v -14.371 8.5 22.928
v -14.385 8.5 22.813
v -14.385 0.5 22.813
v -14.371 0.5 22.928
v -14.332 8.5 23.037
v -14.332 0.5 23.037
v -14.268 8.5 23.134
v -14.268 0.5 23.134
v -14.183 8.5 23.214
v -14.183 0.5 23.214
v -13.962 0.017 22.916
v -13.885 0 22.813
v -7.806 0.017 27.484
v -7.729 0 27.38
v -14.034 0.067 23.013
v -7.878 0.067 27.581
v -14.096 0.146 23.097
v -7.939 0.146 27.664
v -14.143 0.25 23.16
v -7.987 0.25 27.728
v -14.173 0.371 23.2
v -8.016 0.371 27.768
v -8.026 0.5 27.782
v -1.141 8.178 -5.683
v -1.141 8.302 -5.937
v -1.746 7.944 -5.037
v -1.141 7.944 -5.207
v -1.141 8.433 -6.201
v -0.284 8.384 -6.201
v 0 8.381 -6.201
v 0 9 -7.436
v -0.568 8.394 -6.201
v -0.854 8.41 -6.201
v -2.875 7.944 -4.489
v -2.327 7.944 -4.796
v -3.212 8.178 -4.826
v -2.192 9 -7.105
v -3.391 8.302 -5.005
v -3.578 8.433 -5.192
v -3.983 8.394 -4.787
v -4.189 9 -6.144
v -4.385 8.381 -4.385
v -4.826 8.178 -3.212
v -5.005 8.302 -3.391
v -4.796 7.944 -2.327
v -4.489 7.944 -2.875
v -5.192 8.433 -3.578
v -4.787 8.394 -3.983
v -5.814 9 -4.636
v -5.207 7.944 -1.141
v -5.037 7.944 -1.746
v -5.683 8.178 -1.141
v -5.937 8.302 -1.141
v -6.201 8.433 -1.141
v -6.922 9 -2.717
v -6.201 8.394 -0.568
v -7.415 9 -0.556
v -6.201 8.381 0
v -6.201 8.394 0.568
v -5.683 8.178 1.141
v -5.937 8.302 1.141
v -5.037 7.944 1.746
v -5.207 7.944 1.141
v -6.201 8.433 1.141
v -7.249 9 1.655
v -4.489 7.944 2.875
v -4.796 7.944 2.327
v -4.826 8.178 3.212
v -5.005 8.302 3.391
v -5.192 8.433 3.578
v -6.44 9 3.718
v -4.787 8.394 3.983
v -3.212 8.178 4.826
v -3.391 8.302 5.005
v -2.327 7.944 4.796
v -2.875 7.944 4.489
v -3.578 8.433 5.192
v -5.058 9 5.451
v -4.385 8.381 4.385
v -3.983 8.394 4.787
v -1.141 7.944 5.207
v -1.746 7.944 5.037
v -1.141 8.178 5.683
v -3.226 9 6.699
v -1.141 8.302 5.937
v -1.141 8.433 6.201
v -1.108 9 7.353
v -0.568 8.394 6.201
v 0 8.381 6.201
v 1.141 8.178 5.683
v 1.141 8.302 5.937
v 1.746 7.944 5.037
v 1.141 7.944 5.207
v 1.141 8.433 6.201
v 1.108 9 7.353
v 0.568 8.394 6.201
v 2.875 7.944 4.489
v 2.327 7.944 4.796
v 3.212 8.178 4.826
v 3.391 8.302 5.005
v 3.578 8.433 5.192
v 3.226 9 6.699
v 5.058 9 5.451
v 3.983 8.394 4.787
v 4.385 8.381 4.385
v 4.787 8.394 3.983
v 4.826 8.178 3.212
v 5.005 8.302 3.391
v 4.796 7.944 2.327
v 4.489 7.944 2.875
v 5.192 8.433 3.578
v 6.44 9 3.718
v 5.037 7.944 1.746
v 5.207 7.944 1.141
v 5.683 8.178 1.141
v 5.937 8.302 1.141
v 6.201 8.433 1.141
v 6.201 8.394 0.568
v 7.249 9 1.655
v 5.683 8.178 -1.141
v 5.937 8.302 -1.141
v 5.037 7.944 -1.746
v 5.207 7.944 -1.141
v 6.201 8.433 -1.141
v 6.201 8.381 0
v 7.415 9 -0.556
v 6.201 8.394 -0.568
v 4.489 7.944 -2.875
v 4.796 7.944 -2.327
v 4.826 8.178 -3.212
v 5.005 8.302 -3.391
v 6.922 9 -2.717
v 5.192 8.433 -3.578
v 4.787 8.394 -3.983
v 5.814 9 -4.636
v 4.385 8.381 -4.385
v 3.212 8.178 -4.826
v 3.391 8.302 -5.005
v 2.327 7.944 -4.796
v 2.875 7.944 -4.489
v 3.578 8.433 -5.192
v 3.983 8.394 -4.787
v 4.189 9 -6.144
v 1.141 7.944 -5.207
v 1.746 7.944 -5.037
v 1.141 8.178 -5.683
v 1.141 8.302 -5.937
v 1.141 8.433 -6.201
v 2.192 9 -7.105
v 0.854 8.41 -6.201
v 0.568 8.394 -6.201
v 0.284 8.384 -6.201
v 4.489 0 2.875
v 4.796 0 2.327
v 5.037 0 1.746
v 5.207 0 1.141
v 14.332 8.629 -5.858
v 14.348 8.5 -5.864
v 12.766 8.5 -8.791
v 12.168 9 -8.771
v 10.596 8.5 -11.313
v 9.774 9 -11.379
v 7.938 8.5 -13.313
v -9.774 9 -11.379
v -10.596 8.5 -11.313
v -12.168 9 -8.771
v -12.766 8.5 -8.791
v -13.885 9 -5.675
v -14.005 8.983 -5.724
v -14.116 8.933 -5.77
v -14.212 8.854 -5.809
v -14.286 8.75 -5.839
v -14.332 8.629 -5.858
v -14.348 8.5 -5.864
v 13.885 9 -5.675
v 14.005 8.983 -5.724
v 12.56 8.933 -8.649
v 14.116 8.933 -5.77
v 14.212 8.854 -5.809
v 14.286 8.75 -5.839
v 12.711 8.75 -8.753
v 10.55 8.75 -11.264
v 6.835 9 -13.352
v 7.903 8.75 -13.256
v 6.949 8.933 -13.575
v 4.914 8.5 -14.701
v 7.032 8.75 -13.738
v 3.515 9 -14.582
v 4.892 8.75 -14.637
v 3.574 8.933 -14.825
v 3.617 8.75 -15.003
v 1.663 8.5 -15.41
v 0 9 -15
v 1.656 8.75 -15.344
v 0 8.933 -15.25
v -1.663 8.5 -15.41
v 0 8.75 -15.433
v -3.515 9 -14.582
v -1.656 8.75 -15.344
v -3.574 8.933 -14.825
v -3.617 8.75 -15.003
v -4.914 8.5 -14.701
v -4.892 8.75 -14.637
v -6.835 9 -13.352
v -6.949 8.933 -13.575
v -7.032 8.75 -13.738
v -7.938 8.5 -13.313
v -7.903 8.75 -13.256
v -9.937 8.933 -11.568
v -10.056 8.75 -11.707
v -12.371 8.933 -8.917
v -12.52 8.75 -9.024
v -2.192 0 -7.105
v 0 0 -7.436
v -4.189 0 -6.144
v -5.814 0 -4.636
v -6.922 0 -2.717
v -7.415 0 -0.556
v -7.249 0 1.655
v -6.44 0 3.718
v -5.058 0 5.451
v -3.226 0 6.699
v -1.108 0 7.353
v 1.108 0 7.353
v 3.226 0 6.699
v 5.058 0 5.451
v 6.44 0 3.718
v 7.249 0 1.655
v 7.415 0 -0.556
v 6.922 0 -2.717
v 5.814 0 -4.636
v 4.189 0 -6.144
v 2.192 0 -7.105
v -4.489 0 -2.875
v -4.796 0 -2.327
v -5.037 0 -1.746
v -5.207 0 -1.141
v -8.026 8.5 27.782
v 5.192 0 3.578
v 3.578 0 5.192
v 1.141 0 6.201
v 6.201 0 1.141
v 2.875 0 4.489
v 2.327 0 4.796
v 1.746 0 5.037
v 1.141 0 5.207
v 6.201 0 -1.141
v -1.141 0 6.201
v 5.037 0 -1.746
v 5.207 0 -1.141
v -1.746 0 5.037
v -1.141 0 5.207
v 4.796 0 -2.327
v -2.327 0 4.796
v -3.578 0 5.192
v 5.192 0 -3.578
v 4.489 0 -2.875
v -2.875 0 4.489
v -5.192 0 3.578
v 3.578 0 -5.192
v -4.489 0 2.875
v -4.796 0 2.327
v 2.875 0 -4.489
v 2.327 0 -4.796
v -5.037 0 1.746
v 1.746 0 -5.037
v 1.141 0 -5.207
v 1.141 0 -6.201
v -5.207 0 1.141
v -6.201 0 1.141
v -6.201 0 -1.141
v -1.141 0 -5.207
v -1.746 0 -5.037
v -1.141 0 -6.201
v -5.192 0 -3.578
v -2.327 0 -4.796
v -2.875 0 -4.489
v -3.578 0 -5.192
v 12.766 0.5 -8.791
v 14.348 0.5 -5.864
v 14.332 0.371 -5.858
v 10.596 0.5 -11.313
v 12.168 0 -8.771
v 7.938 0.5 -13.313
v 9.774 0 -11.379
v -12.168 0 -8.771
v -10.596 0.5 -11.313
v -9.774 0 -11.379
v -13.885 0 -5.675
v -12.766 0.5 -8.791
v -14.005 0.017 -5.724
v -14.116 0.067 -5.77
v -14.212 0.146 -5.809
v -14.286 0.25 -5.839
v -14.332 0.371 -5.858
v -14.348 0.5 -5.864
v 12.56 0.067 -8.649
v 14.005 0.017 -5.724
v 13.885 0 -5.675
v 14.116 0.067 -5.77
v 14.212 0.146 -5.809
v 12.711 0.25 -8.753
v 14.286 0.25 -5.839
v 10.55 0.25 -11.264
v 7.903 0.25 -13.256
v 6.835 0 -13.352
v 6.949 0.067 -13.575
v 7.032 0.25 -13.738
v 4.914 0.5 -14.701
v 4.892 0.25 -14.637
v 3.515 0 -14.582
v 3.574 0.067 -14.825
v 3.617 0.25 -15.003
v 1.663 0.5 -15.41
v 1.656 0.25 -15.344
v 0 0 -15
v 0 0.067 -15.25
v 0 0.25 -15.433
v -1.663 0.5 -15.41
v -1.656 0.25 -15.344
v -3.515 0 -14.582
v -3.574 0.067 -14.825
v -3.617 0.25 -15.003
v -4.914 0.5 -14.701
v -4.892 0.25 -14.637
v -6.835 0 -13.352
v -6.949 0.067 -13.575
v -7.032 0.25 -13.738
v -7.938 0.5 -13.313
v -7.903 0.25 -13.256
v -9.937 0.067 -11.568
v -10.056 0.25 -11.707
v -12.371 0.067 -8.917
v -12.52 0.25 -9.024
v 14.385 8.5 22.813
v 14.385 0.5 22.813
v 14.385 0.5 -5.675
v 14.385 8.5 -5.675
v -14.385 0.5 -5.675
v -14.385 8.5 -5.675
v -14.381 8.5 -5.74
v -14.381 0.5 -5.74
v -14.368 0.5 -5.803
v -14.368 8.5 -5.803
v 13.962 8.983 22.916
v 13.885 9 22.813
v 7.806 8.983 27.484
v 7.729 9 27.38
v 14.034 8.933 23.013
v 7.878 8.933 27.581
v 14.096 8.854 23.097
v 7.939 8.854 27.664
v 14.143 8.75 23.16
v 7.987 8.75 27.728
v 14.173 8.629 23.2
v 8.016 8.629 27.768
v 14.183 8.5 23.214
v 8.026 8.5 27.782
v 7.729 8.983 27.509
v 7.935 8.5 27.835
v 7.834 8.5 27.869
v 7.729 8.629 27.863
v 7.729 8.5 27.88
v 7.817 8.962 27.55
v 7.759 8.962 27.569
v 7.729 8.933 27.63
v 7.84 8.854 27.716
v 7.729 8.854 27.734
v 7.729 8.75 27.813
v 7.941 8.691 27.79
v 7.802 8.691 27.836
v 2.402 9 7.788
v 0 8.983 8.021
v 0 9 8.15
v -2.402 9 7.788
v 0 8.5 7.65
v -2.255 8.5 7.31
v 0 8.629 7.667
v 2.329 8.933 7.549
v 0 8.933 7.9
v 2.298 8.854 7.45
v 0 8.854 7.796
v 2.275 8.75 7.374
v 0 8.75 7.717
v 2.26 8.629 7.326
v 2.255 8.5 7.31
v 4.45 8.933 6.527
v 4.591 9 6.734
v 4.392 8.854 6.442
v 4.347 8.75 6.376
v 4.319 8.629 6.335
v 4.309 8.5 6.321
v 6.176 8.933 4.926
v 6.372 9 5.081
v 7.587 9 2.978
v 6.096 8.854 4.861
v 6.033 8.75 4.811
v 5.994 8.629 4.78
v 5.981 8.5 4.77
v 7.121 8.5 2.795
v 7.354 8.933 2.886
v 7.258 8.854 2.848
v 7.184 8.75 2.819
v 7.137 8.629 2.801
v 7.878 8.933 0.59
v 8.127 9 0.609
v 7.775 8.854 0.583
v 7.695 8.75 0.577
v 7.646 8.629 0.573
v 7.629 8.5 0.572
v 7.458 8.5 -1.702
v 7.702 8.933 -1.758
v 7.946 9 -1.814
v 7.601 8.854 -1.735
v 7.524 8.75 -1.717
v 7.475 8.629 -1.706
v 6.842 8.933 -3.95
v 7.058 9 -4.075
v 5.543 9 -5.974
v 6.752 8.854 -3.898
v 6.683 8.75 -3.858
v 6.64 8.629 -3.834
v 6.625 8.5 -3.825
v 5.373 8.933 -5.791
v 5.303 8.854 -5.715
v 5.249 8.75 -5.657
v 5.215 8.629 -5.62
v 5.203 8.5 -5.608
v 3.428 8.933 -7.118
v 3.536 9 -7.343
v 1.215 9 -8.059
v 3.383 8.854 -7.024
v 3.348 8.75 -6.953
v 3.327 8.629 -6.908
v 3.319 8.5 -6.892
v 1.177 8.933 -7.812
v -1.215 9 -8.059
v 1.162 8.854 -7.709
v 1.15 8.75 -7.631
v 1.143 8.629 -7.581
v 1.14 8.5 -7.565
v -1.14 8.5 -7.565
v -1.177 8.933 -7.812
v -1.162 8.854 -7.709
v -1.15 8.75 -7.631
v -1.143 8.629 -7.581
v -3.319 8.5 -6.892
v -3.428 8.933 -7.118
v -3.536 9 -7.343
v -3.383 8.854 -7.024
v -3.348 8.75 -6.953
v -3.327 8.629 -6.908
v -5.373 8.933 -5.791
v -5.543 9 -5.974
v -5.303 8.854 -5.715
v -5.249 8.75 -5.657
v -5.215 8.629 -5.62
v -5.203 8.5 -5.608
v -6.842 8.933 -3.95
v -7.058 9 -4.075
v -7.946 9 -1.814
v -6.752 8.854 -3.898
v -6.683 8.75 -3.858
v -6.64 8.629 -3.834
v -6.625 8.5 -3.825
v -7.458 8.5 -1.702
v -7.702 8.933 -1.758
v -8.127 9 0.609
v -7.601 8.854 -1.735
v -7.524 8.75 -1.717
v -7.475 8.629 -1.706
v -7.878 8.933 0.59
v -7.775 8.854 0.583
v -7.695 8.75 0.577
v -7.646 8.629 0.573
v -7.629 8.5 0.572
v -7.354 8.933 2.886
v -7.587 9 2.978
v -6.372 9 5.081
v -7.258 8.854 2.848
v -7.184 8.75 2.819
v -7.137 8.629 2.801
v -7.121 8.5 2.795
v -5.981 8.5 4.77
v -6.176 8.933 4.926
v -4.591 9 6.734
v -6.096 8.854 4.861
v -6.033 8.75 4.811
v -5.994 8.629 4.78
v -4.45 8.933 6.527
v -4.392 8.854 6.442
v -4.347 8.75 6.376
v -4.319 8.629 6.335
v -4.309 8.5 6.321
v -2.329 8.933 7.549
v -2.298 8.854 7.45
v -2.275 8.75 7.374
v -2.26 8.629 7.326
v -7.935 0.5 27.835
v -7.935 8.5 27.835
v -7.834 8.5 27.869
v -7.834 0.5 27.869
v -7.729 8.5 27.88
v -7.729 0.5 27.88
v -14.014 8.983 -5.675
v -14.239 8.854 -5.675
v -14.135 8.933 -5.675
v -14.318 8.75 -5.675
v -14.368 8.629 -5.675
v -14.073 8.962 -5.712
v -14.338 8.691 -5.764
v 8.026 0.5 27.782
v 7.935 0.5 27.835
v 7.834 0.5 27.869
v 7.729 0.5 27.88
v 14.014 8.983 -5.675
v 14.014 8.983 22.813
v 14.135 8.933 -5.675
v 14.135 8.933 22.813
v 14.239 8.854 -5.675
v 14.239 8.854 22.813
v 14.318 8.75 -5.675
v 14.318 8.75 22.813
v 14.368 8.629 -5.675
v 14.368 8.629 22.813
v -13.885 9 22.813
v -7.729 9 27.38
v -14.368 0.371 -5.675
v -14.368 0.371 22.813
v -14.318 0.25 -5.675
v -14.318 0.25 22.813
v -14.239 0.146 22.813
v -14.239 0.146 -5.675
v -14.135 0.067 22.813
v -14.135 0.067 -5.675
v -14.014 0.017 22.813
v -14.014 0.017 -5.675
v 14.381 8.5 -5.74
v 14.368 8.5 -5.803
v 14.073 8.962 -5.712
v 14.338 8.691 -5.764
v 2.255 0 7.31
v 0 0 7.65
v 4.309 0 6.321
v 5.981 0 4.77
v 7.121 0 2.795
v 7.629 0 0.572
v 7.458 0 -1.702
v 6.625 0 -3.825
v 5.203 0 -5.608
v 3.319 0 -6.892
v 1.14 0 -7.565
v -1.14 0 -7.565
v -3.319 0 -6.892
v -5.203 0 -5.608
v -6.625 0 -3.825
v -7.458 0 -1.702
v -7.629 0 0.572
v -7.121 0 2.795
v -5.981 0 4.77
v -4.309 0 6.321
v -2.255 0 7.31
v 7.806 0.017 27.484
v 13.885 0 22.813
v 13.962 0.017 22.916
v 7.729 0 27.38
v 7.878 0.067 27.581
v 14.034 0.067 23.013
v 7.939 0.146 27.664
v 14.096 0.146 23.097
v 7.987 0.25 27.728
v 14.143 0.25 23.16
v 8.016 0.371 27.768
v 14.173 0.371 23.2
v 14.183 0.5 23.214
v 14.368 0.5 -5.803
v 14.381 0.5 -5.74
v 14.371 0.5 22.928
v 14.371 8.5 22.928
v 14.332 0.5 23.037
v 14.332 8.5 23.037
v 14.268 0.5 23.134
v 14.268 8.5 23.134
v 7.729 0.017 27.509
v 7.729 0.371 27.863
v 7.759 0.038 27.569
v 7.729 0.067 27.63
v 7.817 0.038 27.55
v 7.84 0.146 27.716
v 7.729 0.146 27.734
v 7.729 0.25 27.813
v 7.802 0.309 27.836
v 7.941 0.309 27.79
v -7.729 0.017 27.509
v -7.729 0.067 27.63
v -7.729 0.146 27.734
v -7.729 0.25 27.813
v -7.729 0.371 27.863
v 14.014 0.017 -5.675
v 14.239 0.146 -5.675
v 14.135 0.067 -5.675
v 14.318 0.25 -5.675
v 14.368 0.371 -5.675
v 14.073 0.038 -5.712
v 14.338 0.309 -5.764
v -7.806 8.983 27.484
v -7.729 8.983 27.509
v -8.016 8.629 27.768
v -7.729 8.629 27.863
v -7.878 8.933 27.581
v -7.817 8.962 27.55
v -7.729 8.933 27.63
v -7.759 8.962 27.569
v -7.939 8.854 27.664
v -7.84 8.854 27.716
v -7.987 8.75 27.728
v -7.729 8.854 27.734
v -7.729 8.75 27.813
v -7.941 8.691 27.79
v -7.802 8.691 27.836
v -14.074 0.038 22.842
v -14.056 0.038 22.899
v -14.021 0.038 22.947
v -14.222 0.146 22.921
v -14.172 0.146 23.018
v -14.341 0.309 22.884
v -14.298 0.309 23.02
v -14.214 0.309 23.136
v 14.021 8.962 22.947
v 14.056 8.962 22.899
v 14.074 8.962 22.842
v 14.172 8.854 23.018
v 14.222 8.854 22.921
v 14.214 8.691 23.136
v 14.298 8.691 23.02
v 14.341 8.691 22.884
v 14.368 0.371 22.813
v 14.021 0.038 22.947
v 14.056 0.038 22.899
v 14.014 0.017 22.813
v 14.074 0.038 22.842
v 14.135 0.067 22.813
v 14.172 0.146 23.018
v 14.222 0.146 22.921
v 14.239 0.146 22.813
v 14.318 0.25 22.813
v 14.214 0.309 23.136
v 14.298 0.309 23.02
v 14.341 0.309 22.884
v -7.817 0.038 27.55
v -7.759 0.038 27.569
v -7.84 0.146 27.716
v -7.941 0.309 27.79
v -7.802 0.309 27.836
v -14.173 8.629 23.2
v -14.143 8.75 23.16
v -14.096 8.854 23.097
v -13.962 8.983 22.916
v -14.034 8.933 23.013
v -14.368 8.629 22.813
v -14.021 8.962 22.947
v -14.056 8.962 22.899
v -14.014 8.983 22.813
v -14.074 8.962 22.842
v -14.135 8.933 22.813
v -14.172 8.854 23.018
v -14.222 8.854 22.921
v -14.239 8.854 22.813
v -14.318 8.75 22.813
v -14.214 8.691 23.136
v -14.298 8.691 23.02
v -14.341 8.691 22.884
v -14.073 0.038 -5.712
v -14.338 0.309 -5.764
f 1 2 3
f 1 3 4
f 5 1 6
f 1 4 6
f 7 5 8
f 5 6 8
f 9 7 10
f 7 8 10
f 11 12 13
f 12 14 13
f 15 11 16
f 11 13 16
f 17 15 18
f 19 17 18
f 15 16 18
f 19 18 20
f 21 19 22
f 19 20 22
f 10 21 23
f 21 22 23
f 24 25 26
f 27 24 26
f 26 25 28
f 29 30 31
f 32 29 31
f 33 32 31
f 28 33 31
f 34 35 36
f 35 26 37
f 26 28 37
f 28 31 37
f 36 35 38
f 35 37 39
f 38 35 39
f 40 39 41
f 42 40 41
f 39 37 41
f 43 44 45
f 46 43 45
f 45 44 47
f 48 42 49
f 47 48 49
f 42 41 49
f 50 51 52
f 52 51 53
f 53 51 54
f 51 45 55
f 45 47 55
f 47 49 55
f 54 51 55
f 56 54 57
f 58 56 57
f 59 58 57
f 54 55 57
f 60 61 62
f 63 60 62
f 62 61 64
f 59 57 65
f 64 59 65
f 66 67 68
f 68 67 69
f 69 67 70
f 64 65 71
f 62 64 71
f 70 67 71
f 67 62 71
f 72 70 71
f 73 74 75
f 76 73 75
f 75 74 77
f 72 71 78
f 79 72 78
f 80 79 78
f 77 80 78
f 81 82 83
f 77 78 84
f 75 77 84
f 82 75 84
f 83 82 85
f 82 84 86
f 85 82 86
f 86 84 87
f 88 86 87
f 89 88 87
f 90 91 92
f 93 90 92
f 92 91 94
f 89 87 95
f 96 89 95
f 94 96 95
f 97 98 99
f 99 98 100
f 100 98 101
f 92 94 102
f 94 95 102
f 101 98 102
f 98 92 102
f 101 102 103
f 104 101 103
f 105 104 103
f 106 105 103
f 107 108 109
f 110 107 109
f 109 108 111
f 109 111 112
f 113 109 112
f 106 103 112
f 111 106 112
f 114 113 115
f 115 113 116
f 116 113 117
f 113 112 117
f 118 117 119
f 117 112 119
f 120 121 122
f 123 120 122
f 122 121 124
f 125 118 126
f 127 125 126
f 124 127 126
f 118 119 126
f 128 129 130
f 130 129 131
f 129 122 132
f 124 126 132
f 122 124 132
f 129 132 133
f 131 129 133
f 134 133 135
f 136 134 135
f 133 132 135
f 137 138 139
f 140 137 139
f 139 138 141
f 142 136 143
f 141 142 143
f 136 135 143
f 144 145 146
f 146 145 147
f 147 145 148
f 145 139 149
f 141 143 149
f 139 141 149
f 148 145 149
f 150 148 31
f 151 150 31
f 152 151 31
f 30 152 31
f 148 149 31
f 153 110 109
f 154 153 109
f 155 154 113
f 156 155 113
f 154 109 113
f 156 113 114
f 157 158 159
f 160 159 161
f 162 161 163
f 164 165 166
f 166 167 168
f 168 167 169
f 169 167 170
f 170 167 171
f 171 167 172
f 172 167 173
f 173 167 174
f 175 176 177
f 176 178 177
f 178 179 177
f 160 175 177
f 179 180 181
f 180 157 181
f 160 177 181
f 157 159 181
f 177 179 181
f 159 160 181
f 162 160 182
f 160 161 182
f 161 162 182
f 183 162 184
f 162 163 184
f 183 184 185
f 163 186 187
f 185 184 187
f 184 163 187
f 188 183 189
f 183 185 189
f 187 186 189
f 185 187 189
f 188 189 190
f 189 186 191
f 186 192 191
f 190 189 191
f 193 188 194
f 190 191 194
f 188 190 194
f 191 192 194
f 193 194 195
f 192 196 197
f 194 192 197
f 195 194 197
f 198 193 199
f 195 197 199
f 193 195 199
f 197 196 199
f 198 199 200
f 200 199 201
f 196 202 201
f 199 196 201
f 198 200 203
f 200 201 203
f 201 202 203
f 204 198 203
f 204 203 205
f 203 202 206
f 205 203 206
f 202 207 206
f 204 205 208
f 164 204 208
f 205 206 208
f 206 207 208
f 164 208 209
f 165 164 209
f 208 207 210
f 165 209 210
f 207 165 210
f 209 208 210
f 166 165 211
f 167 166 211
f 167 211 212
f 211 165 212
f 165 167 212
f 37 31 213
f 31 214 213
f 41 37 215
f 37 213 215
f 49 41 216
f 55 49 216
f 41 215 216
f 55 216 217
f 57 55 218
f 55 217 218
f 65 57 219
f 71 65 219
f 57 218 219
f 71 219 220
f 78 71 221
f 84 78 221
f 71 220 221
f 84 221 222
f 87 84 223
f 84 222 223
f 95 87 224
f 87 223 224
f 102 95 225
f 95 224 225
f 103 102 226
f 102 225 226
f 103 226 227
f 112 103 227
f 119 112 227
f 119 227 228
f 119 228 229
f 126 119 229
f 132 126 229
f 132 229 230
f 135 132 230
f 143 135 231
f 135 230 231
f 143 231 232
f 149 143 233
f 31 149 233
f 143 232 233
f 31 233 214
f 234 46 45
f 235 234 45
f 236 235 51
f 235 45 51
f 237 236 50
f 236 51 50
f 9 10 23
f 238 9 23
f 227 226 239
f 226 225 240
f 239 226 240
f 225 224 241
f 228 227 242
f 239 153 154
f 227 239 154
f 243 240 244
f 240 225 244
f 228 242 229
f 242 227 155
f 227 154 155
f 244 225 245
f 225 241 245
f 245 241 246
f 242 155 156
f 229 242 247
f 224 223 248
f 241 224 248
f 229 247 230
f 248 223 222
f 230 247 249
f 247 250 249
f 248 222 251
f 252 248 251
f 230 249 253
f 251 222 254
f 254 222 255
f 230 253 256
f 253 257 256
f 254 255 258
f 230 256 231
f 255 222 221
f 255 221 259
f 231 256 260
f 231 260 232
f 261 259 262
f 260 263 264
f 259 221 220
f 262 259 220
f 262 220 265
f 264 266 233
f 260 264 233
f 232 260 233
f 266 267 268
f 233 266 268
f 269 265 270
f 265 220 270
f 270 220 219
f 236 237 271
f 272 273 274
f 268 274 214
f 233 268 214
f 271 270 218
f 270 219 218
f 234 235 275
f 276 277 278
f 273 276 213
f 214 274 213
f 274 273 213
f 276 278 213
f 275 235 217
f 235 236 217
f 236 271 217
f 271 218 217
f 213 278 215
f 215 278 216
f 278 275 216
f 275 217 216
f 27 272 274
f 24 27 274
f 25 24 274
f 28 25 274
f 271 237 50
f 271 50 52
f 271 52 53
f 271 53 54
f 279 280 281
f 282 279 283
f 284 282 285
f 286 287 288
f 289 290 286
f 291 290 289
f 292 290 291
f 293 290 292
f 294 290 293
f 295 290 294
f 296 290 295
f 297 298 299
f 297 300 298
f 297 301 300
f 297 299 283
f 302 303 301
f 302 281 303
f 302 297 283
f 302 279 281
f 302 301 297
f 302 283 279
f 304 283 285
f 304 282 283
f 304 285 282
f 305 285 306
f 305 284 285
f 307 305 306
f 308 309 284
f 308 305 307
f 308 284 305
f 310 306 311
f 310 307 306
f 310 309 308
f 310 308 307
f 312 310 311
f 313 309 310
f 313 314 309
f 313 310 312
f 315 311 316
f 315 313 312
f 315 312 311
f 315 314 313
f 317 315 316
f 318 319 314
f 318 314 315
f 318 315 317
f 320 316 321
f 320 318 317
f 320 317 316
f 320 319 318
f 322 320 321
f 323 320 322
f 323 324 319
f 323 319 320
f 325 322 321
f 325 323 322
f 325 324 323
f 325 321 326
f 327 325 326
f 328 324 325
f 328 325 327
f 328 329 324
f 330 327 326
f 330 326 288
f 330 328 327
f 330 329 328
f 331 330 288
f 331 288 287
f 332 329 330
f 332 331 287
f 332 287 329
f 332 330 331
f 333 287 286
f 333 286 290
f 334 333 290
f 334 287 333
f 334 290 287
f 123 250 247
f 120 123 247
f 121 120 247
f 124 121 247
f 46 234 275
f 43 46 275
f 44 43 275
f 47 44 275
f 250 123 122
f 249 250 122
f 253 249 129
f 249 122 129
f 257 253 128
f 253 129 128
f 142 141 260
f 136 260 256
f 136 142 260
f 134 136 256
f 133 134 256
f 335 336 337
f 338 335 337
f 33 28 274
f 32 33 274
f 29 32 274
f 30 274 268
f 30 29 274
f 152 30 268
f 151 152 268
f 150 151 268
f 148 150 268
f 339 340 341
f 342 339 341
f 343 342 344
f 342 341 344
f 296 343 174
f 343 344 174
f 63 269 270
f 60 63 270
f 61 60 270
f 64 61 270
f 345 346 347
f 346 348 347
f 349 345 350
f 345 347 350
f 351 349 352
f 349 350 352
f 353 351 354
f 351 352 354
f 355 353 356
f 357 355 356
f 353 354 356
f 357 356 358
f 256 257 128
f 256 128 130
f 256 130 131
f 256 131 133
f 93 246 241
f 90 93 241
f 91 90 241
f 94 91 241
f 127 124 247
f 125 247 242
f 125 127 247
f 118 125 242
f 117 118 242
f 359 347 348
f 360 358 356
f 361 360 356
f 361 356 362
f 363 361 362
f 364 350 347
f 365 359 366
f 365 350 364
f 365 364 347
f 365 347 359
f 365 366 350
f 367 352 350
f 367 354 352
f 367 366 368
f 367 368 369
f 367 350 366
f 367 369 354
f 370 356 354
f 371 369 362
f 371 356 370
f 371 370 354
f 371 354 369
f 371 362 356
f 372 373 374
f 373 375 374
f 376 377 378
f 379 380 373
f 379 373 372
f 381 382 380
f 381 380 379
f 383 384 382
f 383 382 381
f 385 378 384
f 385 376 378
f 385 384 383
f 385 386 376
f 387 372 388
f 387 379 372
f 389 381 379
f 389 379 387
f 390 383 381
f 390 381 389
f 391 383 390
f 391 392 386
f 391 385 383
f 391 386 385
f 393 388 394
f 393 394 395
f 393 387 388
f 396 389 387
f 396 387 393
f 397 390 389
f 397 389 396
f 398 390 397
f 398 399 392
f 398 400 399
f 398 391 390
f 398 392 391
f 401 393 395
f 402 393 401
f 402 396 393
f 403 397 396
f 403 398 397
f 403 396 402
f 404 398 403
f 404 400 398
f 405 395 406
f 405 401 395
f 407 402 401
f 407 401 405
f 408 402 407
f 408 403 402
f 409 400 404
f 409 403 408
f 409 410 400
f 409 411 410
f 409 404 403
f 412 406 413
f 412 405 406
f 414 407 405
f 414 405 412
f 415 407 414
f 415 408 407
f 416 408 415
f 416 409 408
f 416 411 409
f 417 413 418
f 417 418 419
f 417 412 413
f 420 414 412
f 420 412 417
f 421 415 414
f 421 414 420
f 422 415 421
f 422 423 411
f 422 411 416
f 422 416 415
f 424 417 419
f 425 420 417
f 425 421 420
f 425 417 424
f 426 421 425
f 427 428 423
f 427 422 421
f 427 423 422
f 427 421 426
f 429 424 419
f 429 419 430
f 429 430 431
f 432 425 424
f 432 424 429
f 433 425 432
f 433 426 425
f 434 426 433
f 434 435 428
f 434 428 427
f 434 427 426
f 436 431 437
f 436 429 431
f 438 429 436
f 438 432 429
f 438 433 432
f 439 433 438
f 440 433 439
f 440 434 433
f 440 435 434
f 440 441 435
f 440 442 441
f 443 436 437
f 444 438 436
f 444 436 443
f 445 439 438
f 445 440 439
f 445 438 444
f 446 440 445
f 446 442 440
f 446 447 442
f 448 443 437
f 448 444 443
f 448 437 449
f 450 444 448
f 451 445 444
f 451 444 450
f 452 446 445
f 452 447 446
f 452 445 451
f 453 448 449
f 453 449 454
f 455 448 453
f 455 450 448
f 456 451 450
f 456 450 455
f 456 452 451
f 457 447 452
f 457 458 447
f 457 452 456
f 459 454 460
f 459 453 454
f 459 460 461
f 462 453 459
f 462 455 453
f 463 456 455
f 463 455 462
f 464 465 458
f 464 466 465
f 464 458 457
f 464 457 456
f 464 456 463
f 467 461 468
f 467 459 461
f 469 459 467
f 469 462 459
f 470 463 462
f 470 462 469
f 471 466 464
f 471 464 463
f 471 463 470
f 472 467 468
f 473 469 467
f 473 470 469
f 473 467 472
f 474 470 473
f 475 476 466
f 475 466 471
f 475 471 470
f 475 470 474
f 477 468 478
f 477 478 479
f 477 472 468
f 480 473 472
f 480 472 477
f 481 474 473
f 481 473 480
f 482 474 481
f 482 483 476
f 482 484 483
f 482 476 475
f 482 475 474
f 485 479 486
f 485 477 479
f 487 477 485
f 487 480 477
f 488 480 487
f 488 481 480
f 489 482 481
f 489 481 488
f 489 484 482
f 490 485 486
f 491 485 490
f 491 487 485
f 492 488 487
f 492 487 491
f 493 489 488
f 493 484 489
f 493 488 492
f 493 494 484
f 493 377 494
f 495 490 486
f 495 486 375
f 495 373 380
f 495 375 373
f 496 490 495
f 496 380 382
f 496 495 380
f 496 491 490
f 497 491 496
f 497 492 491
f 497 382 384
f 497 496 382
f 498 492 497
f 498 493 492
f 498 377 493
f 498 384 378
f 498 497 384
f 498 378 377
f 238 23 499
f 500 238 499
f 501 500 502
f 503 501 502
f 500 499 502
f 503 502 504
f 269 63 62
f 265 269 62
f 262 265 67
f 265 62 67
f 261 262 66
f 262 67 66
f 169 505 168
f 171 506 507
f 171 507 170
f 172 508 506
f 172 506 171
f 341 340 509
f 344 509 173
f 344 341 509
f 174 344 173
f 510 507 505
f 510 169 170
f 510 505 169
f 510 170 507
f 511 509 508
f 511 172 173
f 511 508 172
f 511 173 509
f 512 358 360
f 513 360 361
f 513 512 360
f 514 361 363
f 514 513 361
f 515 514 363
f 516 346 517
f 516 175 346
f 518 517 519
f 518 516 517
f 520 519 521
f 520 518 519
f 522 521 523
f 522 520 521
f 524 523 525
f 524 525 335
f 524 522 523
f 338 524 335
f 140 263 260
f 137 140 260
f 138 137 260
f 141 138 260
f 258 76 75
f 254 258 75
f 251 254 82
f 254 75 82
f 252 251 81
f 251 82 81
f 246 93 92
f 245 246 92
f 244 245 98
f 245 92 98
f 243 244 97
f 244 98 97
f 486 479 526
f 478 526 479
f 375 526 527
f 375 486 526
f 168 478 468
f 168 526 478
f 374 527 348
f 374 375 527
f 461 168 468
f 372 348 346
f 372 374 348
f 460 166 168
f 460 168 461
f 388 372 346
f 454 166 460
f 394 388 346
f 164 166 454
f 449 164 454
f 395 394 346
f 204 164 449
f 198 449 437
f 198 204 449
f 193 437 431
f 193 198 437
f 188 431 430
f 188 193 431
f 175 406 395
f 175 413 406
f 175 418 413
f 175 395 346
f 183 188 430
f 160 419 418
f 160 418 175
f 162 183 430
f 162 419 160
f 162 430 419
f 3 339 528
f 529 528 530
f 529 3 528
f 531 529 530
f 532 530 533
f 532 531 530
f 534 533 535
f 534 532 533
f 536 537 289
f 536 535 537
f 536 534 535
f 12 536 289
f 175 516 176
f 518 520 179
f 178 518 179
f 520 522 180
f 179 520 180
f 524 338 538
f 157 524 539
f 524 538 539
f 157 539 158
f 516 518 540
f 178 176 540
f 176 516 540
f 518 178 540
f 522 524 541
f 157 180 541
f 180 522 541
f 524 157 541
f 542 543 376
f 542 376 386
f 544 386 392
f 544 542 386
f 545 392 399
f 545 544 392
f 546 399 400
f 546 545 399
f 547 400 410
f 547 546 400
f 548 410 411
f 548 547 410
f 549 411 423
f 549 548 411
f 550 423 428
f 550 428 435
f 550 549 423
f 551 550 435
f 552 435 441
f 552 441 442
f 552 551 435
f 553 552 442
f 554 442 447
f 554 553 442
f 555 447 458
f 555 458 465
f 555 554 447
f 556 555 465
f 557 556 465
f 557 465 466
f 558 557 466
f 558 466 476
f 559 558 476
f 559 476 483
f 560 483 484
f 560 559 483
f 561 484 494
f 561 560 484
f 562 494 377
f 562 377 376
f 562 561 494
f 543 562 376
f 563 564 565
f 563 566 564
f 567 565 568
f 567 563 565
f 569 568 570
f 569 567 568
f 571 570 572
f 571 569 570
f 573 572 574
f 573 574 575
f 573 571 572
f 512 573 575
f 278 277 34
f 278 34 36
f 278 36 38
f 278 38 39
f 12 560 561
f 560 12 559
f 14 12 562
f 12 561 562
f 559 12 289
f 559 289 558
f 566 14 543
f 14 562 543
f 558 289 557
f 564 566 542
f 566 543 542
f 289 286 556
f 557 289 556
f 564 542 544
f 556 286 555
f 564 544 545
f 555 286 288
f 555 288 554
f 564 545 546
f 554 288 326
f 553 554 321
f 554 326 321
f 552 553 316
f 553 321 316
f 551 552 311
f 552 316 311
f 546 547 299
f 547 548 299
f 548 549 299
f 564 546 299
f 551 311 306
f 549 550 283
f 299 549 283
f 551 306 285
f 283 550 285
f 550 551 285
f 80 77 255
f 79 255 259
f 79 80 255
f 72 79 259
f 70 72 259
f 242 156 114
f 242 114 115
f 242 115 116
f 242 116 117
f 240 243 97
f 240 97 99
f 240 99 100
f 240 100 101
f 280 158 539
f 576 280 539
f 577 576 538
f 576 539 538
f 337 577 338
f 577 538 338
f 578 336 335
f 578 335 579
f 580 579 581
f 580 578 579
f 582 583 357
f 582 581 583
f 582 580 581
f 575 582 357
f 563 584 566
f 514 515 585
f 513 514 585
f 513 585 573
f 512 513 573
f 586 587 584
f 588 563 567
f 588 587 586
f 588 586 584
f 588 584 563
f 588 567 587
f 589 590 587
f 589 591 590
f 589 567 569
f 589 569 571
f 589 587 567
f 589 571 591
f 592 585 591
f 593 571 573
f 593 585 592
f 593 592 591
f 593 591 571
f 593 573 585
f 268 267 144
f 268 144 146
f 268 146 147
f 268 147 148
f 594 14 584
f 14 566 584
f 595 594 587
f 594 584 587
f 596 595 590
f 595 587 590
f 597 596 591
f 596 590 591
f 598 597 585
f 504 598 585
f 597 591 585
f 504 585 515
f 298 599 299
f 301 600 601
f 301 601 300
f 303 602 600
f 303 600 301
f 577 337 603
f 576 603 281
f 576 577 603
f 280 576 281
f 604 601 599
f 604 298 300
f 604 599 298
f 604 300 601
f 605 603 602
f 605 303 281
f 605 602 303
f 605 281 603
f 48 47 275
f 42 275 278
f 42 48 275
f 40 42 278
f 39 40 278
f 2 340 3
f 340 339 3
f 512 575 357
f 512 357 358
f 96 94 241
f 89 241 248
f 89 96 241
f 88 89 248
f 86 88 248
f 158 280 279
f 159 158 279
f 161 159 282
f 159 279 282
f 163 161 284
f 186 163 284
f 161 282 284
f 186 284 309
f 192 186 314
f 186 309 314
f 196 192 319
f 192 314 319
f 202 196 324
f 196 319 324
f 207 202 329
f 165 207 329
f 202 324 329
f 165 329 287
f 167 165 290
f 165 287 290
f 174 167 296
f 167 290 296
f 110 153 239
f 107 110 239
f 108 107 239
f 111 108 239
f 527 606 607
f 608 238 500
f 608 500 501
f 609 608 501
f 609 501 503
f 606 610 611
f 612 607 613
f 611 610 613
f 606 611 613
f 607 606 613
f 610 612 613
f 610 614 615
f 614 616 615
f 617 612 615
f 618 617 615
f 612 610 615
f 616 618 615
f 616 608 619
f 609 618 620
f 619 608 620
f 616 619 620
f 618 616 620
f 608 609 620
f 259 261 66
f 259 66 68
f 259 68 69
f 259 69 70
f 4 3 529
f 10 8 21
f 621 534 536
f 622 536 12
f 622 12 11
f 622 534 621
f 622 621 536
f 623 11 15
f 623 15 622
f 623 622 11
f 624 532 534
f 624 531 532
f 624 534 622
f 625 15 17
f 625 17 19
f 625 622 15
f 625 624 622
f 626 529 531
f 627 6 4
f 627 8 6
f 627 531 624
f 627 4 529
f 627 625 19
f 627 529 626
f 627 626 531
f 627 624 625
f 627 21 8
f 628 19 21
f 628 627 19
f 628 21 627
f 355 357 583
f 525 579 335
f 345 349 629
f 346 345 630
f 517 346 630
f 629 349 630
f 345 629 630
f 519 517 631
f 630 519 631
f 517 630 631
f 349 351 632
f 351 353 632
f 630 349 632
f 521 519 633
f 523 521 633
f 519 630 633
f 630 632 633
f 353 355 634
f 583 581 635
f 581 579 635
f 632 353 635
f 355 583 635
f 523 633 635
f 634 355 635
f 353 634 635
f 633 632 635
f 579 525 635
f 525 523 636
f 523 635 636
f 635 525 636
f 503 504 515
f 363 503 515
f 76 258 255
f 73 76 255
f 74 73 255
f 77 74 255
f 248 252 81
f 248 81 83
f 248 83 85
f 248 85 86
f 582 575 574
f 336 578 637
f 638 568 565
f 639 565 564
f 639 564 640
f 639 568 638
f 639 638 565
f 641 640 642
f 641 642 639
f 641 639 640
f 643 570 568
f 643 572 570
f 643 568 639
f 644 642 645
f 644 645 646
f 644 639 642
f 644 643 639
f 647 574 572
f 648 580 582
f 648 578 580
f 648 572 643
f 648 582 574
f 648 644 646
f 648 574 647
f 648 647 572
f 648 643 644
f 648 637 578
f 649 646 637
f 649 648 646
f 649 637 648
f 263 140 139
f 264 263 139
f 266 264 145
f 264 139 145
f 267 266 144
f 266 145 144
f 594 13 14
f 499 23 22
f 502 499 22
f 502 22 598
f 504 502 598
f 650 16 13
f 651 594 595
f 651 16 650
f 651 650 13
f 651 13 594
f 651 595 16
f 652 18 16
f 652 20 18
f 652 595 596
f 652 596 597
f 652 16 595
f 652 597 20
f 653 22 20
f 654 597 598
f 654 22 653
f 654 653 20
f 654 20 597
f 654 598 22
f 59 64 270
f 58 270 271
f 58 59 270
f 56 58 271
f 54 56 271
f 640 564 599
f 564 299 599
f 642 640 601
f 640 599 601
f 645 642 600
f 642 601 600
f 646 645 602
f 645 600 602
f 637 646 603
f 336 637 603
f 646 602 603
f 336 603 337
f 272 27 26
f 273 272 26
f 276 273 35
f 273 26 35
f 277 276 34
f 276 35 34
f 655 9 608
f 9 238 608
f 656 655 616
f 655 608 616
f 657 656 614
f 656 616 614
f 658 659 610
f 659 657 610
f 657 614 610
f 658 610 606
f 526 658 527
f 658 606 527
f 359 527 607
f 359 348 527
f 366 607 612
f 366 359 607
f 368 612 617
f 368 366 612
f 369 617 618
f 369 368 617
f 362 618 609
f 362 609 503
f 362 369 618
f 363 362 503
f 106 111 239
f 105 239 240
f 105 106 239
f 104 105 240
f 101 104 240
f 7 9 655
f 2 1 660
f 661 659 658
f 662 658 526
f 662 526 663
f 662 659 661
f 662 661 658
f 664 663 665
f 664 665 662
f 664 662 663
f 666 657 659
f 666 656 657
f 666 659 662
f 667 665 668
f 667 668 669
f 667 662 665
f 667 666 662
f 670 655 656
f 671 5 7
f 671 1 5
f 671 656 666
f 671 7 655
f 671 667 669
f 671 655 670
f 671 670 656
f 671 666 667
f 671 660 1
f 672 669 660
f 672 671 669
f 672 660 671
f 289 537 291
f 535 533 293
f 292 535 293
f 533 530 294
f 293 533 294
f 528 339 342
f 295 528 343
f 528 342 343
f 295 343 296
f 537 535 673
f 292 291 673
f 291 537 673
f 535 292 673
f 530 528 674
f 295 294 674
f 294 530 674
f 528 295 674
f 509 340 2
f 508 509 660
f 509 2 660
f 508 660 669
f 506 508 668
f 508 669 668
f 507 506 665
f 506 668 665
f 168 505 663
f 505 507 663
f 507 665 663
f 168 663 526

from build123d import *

# Parameters (mm, degrees)
SKETCH1_R           = 7.65
BOSS_EXTRUDE1_DEPTH = 9
CUT_EXTRUDE1_DEPTH  = 9
SKETCH7_W           = 2.28233216
SKETCH7_H           = 6.201106096
CUT_EXTRUDE2_DEPTH  = 33.637748467
CIRPATTERN1_COUNT   = 8
FILLET1_R           = 0.5


with BuildPart() as part:
    # Sketch1 → Boss-Extrude1 (new body)
    with BuildSketch(Plane(origin=(0, 0, 0), x_dir=(1, 0, 0), z_dir=(0, 1, 0))):
        with BuildLine():
            Line((-14.385, 5.772501624), (-14.385, -27.88))
            Line((-14.385, -27.88), (14.385, -27.88))
            Line((14.385, -27.88), (14.385, 5.772501624))
            ThreePointArc((14.385, 5.772501624), (0, 15.5), (-14.385, 5.772501624))
        make_face()
        Circle(SKETCH1_R, mode=Mode.SUBTRACT)
    extrude(amount=BOSS_EXTRUDE1_DEPTH)

    # Sketch3 → Cut-Extrude1 (cut)
    with BuildSketch(Plane(origin=(0, 9, 0), x_dir=(1, 0, 0), z_dir=(0, 1, 0))):
        Polygon((14.385, -23.064188118), (7.893798328, -27.88), (14.385, -27.88), align=None)
        Polygon((-14.385, -27.88), (-14.385, -23.064188118), (-7.893798328, -27.88), align=None)
    extrude(amount=-CUT_EXTRUDE1_DEPTH, mode=Mode.SUBTRACT)

    # Fillet1
    fillet1_edges = [part.edges().sort_by_distance(p)[0] for p in [
        (0, 9, -15.5),
        (0, 0, -15.5),
        (14.385, 4.5, -5.772501624),
        (14.385, 0, 8.645843247),
        (14.385, 9, 8.645843247),
        (14.385, 4.5, 23.064188118),
        (11.139399164, 0, 25.472094059),
        (11.139399164, 9, 25.472094059),
        (7.893798328, 4.5, 27.88),
        (0, 0, 27.88),
        (0, 9, 27.88),
        (-14.385, 4.5, -5.772501624),
        (-14.385, 9, 8.645843247),
        (-14.385, 0, 8.645843247),
        (-7.893798328, 4.5, 27.88),
        (-11.139399164, 0, 25.472094059),
        (-14.385, 4.5, 23.064188118),
        (-11.139399164, 9, 25.472094059),
        (-7.65, 9, 0),
    ]]
    fillet(fillet1_edges, radius=FILLET1_R)


with BuildPart() as body_2:
    # Sketch6 → Revolve1 (revolve)
    with BuildSketch(Plane(origin=(0, 0, 0), x_dir=(0, 0, -1), z_dir=(1, 0, 0))):
        Polygon((-7.435802811, 9), (-7.435802811, 0), (-5.330679473, 0), (-5.330679473, 7.943849085), align=None)
    revolve(axis=Axis((0, 0, 0), (0, 1, 0)))

    # Sketch7 → Cut-Extrude2 (cut, symmetric)
    with BuildSketch(Plane(origin=(0, 0, 0), x_dir=(1, 0, 0), z_dir=(0, 1, 0))):
        with Locations((0, 3.100553048)):
            Rectangle(SKETCH7_W, SKETCH7_H)
    cut_extrude2 = extrude(amount=CUT_EXTRUDE2_DEPTH, both=True, mode=Mode.SUBTRACT)

    # CirPattern1: Cut-Extrude2 ×8 about axis
    cirpattern1_axis = Axis((0, 9.45, 0), (0, -1, 0))
    for i in range(1, CIRPATTERN1_COUNT):
        add(cut_extrude2.rotate(cirpattern1_axis, i * 360 / CIRPATTERN1_COUNT), mode=Mode.SUBTRACT)


solid = Compound([part.part, body_2.part])
